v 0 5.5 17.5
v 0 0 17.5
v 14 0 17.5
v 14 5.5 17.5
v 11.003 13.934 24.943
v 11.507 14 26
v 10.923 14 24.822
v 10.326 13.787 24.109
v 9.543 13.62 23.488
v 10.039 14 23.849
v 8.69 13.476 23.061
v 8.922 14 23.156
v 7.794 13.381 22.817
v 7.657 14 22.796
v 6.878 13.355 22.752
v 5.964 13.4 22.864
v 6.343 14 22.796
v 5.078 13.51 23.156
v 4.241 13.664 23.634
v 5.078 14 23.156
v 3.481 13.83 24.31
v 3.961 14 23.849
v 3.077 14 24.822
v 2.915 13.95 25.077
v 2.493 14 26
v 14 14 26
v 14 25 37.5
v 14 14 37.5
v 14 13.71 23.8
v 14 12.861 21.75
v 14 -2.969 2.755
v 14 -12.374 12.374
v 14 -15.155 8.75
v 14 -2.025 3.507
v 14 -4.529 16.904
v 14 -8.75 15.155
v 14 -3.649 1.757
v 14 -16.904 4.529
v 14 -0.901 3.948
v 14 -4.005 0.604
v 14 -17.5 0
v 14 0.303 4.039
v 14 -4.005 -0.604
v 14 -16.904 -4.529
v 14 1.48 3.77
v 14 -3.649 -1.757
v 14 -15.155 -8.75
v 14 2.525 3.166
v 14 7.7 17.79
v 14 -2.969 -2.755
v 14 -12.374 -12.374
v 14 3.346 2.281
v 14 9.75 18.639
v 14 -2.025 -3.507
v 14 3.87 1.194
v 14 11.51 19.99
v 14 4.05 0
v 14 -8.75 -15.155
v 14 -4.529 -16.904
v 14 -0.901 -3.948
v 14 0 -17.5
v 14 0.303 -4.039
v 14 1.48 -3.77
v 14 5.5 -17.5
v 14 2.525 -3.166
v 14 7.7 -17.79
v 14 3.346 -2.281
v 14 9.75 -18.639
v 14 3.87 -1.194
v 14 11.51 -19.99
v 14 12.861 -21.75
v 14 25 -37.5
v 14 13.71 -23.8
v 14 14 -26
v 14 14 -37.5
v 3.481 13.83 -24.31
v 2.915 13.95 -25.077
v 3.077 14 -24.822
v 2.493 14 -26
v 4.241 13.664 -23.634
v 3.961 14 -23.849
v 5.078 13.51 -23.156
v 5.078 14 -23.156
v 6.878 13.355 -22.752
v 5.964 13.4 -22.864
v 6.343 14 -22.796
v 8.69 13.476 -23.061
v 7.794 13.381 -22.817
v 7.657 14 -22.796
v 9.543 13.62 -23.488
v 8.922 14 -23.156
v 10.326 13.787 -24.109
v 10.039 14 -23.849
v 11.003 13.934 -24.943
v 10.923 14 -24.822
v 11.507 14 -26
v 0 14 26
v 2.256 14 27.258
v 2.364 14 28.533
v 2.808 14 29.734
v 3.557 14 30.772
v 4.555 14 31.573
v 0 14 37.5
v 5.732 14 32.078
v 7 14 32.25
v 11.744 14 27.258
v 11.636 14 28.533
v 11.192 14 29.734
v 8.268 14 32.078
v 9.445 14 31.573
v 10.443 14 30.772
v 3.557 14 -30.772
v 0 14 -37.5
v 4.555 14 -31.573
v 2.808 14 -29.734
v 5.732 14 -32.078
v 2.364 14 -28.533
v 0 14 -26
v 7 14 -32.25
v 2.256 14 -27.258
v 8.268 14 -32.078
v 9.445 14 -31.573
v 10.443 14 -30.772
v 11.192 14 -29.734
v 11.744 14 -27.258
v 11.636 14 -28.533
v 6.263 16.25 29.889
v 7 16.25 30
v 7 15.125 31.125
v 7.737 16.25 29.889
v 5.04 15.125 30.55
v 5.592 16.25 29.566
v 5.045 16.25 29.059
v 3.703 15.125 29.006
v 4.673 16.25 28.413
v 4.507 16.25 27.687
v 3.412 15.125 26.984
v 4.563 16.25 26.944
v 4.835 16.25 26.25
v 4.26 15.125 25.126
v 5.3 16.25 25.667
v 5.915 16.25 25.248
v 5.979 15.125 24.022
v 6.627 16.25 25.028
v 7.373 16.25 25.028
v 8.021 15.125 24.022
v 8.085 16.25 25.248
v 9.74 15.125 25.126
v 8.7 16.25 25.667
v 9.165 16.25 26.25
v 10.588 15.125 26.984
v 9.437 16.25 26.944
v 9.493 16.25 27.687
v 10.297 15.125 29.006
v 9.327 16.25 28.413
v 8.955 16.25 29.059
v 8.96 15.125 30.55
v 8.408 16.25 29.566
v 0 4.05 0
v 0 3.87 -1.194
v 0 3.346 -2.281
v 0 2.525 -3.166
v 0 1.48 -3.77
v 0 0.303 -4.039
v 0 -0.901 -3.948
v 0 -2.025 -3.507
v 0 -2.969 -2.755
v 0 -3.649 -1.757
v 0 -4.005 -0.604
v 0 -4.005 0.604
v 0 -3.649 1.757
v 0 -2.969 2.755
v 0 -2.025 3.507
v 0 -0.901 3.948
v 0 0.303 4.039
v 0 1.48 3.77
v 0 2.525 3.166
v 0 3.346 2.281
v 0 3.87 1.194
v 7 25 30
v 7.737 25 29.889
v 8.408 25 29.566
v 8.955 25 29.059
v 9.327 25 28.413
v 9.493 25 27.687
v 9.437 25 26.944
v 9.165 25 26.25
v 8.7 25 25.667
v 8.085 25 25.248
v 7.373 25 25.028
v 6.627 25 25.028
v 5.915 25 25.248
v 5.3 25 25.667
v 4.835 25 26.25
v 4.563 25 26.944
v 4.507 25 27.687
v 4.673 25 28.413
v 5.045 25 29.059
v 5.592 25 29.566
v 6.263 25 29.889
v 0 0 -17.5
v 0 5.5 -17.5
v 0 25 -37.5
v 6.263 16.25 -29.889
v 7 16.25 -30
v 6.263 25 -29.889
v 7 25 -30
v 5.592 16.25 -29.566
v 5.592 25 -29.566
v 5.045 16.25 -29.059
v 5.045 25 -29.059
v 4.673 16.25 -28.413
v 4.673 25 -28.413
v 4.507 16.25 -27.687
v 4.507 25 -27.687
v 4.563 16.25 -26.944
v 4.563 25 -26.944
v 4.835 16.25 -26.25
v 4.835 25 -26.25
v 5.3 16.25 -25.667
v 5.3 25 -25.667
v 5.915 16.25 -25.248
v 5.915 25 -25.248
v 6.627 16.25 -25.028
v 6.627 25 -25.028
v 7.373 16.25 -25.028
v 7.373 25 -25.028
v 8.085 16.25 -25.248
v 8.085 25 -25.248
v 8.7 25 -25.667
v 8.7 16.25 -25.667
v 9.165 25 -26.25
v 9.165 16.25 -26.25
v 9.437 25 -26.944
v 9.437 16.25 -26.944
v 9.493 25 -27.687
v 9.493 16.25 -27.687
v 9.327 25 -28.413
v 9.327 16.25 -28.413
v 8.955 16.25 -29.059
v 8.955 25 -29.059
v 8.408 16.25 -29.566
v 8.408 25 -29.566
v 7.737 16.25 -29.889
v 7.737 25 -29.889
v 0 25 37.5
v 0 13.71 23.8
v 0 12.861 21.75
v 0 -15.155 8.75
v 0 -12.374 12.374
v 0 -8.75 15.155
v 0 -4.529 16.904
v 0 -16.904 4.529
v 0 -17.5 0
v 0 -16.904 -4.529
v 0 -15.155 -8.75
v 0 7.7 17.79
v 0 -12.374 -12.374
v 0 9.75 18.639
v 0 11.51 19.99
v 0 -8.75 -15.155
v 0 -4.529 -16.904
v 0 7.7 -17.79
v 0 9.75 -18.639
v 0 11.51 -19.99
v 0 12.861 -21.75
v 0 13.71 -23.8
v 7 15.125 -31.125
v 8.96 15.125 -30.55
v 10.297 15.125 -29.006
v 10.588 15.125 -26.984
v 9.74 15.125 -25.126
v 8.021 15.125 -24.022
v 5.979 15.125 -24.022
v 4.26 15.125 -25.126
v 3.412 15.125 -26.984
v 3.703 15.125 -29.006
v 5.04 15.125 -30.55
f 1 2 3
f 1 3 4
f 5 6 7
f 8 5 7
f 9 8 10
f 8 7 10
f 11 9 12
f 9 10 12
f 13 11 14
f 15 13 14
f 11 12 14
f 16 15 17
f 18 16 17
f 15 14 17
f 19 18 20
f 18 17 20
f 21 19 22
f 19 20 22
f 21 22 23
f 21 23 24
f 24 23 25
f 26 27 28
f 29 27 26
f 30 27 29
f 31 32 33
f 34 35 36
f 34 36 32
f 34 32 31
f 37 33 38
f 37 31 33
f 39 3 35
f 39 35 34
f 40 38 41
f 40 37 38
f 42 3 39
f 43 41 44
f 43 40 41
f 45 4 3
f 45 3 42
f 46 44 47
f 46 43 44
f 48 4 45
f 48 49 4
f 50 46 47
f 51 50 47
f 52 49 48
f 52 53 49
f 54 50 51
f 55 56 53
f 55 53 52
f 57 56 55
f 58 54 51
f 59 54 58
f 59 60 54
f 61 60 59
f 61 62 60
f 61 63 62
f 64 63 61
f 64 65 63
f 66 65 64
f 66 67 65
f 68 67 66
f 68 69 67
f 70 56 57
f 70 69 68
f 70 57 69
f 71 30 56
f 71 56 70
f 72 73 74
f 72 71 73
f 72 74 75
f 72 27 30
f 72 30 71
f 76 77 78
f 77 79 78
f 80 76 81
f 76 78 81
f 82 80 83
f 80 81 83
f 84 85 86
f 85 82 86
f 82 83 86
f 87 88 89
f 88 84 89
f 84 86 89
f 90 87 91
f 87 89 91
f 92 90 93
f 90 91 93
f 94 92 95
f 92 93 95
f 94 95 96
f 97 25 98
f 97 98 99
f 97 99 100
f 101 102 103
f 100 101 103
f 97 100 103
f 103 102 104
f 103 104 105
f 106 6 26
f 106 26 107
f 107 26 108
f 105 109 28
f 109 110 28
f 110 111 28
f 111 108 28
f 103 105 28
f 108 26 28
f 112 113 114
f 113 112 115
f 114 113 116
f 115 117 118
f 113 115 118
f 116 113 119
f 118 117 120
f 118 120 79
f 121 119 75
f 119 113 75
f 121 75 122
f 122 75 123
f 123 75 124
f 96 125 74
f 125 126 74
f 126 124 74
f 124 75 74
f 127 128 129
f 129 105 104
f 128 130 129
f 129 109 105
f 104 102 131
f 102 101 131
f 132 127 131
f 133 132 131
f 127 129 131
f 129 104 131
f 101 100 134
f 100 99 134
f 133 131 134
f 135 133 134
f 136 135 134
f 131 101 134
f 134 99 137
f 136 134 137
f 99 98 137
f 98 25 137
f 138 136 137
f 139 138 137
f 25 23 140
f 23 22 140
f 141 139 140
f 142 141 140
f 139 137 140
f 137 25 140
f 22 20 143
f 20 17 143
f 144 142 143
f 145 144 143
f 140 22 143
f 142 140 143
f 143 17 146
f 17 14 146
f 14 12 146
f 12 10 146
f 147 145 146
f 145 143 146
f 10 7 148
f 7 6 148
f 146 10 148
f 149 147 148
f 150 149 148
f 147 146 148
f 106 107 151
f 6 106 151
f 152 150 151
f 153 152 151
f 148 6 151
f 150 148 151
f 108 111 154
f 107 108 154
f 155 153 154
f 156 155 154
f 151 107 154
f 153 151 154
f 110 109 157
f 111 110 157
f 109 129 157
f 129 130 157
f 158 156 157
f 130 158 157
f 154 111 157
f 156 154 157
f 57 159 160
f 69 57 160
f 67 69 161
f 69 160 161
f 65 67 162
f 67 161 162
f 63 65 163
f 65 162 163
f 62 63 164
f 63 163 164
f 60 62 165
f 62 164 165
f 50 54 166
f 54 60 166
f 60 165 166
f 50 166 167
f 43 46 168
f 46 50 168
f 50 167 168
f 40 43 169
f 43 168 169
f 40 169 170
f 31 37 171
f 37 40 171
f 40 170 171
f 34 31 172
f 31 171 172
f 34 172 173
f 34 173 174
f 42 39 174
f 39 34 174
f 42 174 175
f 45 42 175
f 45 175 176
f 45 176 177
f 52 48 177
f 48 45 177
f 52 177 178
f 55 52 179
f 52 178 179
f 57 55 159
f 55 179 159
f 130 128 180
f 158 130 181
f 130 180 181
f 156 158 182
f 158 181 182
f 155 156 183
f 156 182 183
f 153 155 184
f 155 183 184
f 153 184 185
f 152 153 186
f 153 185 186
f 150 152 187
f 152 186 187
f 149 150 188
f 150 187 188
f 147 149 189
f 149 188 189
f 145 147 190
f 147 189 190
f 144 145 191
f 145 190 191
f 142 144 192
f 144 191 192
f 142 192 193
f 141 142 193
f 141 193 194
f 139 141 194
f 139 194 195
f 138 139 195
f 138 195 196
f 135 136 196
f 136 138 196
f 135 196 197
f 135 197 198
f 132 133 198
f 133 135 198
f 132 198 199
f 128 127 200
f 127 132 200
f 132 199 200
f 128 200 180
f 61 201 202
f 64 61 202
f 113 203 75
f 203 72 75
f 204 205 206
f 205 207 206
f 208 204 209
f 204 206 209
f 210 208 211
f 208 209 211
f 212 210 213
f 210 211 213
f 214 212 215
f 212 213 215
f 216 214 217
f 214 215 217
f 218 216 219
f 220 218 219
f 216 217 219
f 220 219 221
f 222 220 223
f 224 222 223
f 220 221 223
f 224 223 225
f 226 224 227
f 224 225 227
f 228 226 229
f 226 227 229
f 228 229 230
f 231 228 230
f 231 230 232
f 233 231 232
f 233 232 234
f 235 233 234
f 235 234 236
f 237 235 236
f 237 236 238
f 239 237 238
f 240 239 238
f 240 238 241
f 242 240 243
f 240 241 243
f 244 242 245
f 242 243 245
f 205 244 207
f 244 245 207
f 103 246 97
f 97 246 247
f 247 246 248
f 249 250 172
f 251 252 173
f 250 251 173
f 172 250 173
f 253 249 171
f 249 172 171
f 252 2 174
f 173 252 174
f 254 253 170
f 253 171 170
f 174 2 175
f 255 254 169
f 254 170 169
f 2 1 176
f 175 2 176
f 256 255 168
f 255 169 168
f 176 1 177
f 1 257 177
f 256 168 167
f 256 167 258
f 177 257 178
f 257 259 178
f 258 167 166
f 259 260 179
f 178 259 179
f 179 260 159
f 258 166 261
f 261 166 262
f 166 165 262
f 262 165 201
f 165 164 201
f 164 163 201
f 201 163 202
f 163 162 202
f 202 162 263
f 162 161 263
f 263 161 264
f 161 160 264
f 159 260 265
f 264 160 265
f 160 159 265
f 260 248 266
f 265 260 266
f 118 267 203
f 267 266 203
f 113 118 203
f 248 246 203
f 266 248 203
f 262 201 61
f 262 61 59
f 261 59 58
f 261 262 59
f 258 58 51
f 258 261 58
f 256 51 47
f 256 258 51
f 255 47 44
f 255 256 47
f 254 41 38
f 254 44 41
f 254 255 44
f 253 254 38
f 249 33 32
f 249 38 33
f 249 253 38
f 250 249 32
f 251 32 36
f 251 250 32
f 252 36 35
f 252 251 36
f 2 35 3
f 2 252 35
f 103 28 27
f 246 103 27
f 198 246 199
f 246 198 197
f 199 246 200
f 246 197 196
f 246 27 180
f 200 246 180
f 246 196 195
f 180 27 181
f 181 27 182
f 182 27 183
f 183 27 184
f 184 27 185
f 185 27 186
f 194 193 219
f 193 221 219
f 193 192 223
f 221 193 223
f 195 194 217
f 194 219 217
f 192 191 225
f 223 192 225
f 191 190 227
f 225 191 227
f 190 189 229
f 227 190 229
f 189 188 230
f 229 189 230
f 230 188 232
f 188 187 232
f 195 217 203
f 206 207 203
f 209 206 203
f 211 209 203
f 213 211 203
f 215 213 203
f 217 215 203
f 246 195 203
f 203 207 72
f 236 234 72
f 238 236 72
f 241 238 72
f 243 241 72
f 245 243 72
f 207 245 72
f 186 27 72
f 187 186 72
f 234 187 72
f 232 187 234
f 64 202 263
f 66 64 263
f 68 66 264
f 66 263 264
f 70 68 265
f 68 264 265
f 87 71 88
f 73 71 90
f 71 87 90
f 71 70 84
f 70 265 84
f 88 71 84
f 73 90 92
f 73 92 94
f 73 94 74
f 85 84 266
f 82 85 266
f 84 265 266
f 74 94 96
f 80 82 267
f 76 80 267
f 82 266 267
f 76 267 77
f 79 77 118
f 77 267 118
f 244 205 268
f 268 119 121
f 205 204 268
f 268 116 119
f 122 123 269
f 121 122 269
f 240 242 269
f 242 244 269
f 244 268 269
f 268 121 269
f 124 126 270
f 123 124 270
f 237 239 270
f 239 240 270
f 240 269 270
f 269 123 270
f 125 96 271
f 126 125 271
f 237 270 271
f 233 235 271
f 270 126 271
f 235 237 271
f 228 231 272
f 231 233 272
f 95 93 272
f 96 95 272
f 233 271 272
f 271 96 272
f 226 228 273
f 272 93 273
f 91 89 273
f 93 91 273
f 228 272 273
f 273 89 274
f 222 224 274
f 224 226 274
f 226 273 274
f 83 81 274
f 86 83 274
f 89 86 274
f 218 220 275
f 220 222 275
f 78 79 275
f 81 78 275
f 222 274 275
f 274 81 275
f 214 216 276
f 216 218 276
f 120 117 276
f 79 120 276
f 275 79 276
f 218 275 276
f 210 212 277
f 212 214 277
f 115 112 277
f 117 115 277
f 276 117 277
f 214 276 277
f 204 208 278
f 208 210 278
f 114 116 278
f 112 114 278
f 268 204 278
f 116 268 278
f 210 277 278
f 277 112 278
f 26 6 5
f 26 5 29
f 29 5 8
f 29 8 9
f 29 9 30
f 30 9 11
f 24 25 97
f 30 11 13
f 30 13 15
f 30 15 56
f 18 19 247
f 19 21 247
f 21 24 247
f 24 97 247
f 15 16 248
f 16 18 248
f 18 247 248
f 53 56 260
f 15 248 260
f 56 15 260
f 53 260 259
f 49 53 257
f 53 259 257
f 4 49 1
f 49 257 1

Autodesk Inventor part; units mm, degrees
ref_plane "YZ Plane" through (0, 0, 0) normal (1, 0, 0) x (0, 1, 0)
ref_plane "XZ Plane" through (0, 0, 0) normal (0, 1, 0) x (-1, 0, 0)
ref_plane "XY Plane" through (0, 0, 0) normal (0, 0, 1) x (1, 0, 0)
sketch "Sketch1" plane through (0, 0, 0) normal (1, 0, 0) x (0, 1, 0)
  circle A0 centre (0, 0) radius 4.05
  circle A1 centre (0, 0) radius 17.5
  line L0 (0, 17.5) -> (25, 17.5)
  line L1 (0, -17.5) -> (25, -17.5)
  line L2 (25, -17.5) -> (25, 17.5)
  dimension "d0" = 8.1
  dimension "d1" = 35
  dimension "d2" = 25
  dimension "d3" = 25
extrude "Extrusion1" add sketch "Sketch1" along normal blind 14
ref_plane "Work Plane1" through (0, 0, 0) normal (0, 0, -1) x (-1, 0, 0)
sketch "Sketch2" plane through (14, 0, 0) normal (1, 0, 0) x (0, 0, -1)
  line L0 (17.5, 25) -> (-17.5, 25) projected
  line L1 (17.5, 25) -> (37.5, 25)
  line L2 (37.5, 25) -> (37.5, 14)
  line L3 (37.5, 14) -> (17.5, 14)
  line L4 (17.5, 14) -> (17.5, 25)
  point P0 (0, 0)
  dimension "d6" = 20
  dimension "d7" = 11
extrude "Extrusion2" add sketch "Sketch2" against normal blind 14
fillet "Fillet1" radius 8.5 1 edges at (7, 14, -17.5)
sketch "Sketch3" plane through (0, 14, -37.5) normal (0, -1, 0) x (1, 0, 0)
  line L0 (14, 0) -> (0, 0) construction
  line L1 (7, 0) -> (7, 10) construction
  point P0 (0, 37.5)
  dimension "d11" = 10
hole "Hole1" at (7, 14, -27.5) direction (0, 1, 0) diameter 5 end through all countersink diameter 9.5 countersink angle 90
sketch "Sketch4" plane through (0, 14, -37.5) normal (0, -1, 0) x (1, 0, 0)
  arc A0 (2.4931, 11.5) -> (11.5069, 11.5) centre (7, 10) ccw projected
  circle A1 centre (7, 10) radius 4.75
  point P0 (0, 37.5)
  point P1 (11.5069, 11.5)
extrude "Extrusion3" cut sketch "Sketch4" along normal blind 14
mirror "Mirror1" about plane through (0, 0, 0) normal (0, 0, -1) of "Hole1", "Extrusion3", "Extrusion2", "Fillet1"
properties part number "Passive Wheel 8mm bore bracket"
